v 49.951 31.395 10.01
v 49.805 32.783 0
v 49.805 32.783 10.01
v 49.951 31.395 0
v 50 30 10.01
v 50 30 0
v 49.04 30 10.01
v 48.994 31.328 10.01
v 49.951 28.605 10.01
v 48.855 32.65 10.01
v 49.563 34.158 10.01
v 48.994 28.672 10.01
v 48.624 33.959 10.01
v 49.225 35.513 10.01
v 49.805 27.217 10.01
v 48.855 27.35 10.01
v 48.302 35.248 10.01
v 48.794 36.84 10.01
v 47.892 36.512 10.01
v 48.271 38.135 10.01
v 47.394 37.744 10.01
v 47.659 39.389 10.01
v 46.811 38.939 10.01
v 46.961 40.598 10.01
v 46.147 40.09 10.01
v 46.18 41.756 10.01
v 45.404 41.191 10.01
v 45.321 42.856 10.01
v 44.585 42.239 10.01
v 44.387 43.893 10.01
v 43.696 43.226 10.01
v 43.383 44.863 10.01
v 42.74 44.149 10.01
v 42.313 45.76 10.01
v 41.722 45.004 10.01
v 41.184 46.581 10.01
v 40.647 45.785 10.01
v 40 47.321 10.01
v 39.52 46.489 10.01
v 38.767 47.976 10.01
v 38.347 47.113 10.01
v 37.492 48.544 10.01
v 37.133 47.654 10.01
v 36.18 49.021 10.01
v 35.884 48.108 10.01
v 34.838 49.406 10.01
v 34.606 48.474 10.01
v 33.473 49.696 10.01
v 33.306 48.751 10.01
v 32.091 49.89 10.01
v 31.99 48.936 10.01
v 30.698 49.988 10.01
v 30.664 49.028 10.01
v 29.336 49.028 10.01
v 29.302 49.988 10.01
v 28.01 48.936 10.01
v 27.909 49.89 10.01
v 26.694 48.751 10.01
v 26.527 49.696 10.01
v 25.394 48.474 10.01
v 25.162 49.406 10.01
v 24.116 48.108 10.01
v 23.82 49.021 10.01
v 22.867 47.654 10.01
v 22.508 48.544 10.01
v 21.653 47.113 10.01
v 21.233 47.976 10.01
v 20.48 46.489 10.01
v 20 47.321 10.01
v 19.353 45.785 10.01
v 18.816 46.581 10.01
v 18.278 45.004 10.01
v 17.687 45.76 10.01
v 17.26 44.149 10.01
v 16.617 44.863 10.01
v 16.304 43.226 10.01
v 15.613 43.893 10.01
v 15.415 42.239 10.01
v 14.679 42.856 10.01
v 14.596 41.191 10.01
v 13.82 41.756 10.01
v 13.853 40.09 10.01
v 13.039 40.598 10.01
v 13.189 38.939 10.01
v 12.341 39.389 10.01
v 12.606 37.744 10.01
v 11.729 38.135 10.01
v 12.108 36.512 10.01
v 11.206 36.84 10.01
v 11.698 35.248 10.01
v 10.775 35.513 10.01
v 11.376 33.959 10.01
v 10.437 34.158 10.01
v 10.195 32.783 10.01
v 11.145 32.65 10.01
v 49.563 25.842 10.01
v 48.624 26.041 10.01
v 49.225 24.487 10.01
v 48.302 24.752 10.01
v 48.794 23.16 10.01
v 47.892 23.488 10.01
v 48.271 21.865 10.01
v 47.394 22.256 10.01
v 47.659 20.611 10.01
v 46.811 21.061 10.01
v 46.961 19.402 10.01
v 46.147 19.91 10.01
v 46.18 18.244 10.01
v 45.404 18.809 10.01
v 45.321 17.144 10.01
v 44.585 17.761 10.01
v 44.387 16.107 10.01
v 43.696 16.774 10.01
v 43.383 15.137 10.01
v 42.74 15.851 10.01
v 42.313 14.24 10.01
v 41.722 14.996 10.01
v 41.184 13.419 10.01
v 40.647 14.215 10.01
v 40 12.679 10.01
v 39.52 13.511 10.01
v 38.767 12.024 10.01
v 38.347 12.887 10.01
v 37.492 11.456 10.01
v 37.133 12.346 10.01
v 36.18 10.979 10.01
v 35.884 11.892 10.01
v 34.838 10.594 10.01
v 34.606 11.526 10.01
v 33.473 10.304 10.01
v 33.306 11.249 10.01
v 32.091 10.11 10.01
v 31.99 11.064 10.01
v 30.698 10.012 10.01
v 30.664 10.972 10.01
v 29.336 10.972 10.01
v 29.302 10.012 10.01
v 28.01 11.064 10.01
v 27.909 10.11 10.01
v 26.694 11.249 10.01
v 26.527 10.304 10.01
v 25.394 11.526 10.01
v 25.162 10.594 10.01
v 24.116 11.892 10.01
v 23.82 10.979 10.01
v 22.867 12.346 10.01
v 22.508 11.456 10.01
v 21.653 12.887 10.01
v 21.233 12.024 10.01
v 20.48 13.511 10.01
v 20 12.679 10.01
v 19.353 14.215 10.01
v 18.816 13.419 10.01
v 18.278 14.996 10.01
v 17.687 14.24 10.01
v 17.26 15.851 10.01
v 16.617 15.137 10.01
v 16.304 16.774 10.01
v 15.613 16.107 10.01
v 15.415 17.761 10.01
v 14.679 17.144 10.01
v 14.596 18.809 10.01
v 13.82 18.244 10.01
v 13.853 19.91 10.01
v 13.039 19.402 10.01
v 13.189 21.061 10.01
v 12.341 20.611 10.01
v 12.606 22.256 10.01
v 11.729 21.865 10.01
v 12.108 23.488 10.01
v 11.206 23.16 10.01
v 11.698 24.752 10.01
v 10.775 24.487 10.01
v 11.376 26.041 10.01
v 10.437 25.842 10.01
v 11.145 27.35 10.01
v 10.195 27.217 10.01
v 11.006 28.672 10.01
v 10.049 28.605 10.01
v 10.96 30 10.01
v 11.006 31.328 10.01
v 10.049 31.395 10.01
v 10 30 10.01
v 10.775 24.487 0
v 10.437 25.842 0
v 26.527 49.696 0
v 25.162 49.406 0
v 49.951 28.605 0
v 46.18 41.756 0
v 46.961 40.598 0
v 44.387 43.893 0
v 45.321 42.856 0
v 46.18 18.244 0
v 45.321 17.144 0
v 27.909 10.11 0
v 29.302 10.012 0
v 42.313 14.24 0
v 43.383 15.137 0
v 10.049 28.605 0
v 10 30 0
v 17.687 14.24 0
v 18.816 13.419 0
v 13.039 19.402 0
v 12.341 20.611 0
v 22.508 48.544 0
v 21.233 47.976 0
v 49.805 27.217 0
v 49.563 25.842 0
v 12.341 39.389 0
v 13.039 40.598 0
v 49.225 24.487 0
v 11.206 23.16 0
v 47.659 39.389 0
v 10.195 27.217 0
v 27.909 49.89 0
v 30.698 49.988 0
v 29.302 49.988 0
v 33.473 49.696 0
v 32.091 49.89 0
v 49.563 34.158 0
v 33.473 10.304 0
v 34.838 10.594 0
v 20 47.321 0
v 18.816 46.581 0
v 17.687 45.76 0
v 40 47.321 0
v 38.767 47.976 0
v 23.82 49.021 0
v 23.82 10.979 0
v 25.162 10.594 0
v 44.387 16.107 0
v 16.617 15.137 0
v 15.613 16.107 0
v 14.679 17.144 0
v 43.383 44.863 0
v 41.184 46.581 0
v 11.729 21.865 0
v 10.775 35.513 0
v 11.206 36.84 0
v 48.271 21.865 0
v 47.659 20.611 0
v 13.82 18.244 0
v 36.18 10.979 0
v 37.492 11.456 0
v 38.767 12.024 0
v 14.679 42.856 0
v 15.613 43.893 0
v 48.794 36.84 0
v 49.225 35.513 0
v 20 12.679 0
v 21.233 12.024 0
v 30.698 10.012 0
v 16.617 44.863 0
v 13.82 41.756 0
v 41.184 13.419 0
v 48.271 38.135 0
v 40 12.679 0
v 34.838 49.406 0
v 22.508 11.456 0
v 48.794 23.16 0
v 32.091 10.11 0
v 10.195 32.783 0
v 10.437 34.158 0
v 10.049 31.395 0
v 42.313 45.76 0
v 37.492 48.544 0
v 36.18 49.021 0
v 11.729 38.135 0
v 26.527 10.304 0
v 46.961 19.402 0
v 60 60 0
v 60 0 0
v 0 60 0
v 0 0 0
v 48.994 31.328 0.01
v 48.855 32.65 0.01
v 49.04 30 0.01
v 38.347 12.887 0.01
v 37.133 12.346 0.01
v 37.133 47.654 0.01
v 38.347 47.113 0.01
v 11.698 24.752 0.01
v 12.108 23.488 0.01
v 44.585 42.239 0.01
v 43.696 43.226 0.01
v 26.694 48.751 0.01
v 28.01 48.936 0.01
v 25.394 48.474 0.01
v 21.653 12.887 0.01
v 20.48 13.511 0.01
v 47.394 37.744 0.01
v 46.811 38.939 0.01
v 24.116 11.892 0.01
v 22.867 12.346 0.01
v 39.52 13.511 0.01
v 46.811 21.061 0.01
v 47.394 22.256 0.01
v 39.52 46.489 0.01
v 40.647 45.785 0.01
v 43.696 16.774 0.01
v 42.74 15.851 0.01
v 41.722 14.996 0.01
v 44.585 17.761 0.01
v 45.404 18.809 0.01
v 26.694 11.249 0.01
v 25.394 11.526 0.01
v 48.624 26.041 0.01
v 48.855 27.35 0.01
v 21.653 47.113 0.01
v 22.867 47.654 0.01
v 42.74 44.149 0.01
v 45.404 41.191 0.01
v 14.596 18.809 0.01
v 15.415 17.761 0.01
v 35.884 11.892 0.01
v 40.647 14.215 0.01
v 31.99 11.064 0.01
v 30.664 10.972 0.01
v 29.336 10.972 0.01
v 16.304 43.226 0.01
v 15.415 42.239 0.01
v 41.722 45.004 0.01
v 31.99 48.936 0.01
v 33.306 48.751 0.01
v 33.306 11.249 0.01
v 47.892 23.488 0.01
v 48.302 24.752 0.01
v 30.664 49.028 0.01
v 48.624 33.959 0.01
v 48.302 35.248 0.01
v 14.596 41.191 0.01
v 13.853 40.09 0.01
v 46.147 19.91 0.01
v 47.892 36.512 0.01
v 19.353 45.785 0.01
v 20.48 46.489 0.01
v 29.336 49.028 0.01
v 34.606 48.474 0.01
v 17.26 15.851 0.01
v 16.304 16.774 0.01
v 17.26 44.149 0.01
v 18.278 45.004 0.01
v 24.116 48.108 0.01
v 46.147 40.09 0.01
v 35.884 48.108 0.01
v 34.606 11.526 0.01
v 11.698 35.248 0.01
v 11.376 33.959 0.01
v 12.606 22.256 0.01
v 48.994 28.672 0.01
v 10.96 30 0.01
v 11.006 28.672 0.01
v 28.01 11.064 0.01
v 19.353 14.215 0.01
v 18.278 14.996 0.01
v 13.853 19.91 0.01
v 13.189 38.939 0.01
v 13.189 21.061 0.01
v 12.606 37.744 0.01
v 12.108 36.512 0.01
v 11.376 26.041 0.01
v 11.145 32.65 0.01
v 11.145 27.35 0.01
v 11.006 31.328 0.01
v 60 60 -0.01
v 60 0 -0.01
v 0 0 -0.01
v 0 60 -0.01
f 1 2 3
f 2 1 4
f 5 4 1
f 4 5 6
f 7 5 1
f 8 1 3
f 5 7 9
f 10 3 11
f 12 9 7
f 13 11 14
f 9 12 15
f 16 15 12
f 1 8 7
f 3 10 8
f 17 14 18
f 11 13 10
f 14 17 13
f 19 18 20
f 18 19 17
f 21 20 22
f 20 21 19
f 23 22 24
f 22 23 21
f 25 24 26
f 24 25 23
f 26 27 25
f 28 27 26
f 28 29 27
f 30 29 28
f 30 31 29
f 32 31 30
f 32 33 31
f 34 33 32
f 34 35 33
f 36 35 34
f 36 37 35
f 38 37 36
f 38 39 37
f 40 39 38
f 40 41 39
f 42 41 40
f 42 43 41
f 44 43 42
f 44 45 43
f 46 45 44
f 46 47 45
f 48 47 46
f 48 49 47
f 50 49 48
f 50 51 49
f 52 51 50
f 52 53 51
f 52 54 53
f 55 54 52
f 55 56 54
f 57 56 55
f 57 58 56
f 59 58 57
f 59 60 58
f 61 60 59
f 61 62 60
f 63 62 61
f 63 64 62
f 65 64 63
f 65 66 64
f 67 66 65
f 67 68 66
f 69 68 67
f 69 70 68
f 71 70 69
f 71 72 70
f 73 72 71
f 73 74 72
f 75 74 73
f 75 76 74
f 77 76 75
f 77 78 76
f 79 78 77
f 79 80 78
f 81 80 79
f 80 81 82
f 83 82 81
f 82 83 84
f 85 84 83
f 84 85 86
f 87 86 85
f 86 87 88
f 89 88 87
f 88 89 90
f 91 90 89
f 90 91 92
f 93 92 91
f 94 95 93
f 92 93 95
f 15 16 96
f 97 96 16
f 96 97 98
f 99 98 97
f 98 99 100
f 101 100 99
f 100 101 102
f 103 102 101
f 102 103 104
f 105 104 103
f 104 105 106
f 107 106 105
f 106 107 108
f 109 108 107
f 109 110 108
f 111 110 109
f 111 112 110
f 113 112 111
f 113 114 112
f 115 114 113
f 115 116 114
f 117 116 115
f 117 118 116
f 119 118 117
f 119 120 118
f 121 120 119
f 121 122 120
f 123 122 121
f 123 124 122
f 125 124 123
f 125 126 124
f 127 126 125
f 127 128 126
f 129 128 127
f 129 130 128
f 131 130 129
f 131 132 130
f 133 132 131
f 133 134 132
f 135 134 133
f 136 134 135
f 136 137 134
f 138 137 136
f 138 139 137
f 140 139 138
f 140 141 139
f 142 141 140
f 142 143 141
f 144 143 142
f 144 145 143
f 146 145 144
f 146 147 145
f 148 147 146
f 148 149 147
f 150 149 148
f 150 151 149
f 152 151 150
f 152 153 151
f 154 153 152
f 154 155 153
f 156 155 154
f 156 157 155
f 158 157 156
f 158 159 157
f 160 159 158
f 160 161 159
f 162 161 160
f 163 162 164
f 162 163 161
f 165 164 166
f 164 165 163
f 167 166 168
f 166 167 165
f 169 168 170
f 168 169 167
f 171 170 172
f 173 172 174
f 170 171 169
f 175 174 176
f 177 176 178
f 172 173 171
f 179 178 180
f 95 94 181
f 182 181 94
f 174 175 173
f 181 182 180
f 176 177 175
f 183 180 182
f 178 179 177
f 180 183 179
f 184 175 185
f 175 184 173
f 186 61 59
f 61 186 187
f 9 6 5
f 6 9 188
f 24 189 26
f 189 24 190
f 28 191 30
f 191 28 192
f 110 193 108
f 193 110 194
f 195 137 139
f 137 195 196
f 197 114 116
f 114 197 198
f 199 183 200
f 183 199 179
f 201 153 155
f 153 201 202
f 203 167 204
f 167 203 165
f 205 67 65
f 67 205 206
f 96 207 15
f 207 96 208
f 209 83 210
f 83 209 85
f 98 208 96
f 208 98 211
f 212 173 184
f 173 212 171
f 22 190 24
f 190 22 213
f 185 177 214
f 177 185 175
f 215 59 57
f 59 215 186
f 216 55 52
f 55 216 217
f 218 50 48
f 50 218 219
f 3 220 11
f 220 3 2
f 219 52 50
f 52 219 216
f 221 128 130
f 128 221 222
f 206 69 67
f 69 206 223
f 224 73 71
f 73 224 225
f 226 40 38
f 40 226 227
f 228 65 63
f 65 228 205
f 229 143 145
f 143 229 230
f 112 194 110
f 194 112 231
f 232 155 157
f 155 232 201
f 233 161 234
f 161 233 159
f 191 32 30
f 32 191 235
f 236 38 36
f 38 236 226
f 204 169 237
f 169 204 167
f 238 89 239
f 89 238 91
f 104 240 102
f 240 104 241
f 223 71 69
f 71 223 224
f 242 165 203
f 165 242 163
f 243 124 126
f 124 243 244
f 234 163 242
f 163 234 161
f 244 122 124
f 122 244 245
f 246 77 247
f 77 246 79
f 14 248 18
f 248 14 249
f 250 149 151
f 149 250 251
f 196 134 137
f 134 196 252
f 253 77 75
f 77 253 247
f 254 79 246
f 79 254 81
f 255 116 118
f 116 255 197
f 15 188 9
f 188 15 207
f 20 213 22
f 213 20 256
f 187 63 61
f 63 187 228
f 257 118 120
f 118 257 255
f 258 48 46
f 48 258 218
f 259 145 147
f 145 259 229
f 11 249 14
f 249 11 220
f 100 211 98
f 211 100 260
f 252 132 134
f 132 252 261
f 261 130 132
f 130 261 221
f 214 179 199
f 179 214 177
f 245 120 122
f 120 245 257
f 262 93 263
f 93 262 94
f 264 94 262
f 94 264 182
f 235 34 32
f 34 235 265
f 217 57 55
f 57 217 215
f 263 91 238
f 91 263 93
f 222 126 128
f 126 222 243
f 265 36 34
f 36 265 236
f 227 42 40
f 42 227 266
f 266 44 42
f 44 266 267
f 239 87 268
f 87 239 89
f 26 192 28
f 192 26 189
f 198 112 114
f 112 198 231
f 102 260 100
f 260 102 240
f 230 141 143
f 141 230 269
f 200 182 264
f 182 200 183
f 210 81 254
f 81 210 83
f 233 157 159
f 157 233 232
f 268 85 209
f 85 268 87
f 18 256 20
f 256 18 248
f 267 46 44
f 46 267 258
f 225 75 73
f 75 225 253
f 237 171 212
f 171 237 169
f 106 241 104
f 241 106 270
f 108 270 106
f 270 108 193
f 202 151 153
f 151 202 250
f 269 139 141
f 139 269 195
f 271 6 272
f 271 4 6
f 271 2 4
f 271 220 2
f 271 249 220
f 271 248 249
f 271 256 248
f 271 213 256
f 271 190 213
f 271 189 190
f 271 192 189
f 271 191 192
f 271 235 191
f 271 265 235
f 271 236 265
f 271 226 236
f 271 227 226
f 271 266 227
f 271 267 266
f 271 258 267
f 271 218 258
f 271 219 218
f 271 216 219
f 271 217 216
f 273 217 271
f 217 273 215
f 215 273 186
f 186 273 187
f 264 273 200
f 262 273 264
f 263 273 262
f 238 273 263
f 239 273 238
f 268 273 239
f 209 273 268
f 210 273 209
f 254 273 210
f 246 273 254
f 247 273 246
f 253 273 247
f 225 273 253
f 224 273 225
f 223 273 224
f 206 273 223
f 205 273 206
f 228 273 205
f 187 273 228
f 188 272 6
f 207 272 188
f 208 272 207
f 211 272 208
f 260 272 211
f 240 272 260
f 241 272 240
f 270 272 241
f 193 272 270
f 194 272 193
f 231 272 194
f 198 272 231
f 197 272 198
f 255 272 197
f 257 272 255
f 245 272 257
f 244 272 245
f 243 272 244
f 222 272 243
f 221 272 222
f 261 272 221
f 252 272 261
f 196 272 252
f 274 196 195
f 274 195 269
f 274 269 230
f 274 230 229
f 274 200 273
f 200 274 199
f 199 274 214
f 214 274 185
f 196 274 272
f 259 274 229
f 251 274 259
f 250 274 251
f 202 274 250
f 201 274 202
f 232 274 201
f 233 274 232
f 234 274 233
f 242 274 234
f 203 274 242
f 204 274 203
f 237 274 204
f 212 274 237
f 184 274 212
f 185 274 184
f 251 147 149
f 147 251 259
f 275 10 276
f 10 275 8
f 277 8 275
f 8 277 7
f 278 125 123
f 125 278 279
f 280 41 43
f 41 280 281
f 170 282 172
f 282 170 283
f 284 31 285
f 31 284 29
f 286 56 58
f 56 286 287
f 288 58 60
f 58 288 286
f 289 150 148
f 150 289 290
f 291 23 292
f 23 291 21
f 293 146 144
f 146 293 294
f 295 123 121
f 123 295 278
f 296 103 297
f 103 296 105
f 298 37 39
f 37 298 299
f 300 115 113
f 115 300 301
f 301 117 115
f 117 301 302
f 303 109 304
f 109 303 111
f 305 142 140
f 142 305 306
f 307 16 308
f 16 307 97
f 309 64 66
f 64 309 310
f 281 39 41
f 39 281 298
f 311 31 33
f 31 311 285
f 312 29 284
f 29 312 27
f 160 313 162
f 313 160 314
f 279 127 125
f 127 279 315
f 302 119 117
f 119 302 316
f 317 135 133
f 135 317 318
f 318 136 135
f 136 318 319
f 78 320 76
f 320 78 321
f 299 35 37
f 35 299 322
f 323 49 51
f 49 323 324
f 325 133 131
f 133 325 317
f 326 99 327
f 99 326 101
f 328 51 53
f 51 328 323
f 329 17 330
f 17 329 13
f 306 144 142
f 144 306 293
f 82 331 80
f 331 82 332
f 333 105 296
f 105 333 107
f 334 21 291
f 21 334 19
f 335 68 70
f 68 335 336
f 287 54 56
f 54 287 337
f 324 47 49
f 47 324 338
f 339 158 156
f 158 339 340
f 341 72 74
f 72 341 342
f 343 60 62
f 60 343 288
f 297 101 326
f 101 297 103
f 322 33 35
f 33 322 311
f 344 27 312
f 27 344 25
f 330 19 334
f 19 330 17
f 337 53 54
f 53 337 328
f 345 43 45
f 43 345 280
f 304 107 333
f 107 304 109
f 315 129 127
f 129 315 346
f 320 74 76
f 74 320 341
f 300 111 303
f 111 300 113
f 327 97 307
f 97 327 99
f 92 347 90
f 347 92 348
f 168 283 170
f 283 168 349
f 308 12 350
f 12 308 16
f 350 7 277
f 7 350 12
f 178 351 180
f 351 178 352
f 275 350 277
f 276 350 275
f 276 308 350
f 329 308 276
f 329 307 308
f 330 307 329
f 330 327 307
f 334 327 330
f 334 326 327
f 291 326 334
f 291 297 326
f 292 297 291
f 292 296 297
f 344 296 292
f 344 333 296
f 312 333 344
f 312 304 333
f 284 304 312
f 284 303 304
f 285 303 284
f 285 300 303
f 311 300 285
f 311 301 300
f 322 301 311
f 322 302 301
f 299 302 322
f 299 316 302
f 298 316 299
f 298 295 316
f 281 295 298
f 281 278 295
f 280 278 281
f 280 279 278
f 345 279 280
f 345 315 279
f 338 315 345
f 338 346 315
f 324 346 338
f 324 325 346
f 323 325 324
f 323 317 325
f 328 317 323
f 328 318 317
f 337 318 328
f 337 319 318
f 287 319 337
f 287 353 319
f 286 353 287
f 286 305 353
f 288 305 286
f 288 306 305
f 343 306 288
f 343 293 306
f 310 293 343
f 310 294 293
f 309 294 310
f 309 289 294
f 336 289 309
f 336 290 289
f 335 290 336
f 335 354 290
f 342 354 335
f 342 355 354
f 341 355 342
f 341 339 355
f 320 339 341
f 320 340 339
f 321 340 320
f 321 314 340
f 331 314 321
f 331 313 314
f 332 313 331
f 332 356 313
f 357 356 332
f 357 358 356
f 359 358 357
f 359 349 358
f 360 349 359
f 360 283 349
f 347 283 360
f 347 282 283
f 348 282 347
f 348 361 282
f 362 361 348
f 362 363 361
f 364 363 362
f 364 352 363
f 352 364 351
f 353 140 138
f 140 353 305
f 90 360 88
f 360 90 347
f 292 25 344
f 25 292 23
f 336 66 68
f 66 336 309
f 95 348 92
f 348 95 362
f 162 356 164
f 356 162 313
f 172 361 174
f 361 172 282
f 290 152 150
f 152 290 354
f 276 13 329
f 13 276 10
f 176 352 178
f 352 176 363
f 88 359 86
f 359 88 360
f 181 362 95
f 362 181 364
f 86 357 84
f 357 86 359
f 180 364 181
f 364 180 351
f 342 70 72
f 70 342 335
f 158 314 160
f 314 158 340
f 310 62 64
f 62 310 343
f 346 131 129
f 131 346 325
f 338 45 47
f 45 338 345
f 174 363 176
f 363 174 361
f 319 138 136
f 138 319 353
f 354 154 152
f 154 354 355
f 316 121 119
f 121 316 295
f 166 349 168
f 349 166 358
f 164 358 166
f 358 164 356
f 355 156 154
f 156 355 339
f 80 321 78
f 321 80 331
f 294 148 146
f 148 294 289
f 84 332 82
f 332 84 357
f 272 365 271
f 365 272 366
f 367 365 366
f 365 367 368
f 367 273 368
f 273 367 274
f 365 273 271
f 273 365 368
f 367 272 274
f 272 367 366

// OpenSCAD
// file: ../Base/PlacementOptions.scad
// Fischertechnik Box Foundation
// Placement Options

// Alignment
NoAlign = 0;
AlignLeft = 1;
AlignBottom = 2;
AlignCenter = 3;
AlignRight = 4;
AlignTop = 5;

// Element rotation degree steps
rotations = [0, -90, -180, -270];

// Rotation
NoRotation = 0;
Rotate0 = 0;
Rotate90 = 1;
Rotate180 = 2;
Rotate270 = 3;

// Docking (seen from above)
NoDock = -1;
DockLeft = 0;
DockTop = 1;
DockRight = 2;
DockCorner = 2;
DockBottom = 3;

// Web corners
LowerLeft = 0;
UpperLeft = 1;
UpperRight = 2;
LowerRight = 3;

// Web position relative to corner
LeftOfCorner = 0;
RightOfCorner = 1;
// file: ../Base/Boxes.scad
// Fischertechnik Box Foundation
// Pre-designed Boxes

use <Constants.scad>

include <PlacementOptions.scad>

box190Width = 190;
box190Depth = 130;
box130Width = 130;
box130Depth = 95;
boxUsageHeight = 33.9;
boxWallThickness = 2.4;
boxBaseThickness = 1.0;
boxWebWidth = 3.0;

// getBoxWallThickness()
// Gets the wall thickness of a Fischertechnik Box

function getBoxWallThickness() = boxWallThickness;

// Gets the usable height of a fischertechnik box
function getBoxUsageHeight() = boxUsageHeight;

// Gets the thickness of the Fischertechnik box base.
function getBoxBaseThickness() = boxBaseThickness;

// Gets the width of a box web
function getBoxWebWidth() = boxWebWidth;

// Gets the usable inner space of a Box 190 as an x/y-list
function getBox190Space() = [
    box190Width - 2*getBoxWallThickness(), 
    box190Depth - 2*getBoxWallThickness() ];

// Imports the Fischertechnik empty box 130x190 mm and places it at position 0,0
// 190x130 are the outer sizes, the inner space is slightly smaller. Use getBox190Space() to get the inner sizes.
// This module needs the STL file "Fischertechnik Box 130x190.stl" in the library path.
// The box is positioned that the usable inner space is at the 0,0,0 position. The

module Box190() {
    translate([-getBoxWallThickness(),-getBoxWallThickness(),-getBoxBaseThickness()])
        import("Fischertechnik Box 130x190.stl", convexity=3);
}

// Gets the usable inner space of a Box 130 as an x/y-list
function getBox130Space() = [
    box130Width - 2*getBoxWallThickness(), 
    box130Depth - 2*getBoxWallThickness() ];

// Imports the Fischertechnik empty box 95x130 mm and places it at position 0,0
// 190x130 are the outer sizes, the inner space is slightly smaller. Use getBox190Space() to get the inner sizes.
// This module needs the STL file "Fischertechnik Box 95x130.stl" in the library path.
// The box is positioned that the usable inner space is at the 0,0,0 position. The

module Box130() {
    translate([-getBoxWallThickness(),-getBoxWallThickness(),-getBoxBaseThickness()])
        import("Fischertechnik Box 95x130.stl", convexity=3);
}

// Creates a web at the specified box walls
// corner 0 = LowerLeft, 1 = UpperLeft, 2 = UpperRight, 3 = LowerRight
// side 0 = LeftOfCorner, 1 = RightOfCorner
// distance = Distance in mm from the corner
// box = inner width and depth of the box (default: Box 190)
// webWidth = length of the web (default is 3 mms)
// webThickness = thickness of the web (default is 1 mm)

module BoxWeb(corner, side, distance, box=getBox190Space(), webWidth=getBoxWebWidth(), webThickness=1.0) {
    sink = getBoxWallThickness()/2;

    width = (corner % 2 == 0) ? 
            (side == LeftOfCorner ? webWidth : webThickness) :
            (side == LeftOfCorner ? webThickness : webWidth);

    depth = (corner % 2 == 0) ? 
            (side == RightOfCorner ? webWidth : webThickness) :
            (side == RightOfCorner ? webThickness : webWidth);
    
    xDiff = corner == LowerLeft ? 
                (side == LeftOfCorner ? -sink : distance) :
            (corner == UpperLeft ?                
                (side == LeftOfCorner ? distance : -sink) :
            (corner == UpperRight ?
                (side == LeftOfCorner ? box.x-webWidth+sink : box.x-distance-webThickness) :
                (side == LeftOfCorner ? box.x-distance-webThickness: box.x-webWidth+sink)));

    yDiff = corner == LowerLeft ? 
                (side == RightOfCorner ? -sink : distance) :
            (corner == UpperLeft ?
                (side == RightOfCorner ? box.y-distance : box.y-webWidth+sink) :
            (corner == UpperRight ?
                (side == RightOfCorner ? box.y-webWidth+sink : box.y-distance) :
                (side == RightOfCorner ? distance : -sink)));
    
    translate([xDiff, yDiff, -getExcess()])
        cube([width, depth, boxUsageHeight + 2*getExcess()]);
}
// file: ../Base/Rotation.scad
// Fischertechnik Box Foundation
// Geometry Helpers Rotation

include <PlacementOptions.scad>

// getRotatedSpace(space, rotation=NoRotation)
// Rotates the space dependent on the specified rotation

function getRotatedSpace(space, rotation=NoRotation) = [
    (rotation == Rotate90 || rotation == Rotate270) ? space.y : space.x,
    (rotation == Rotate90 || rotation == Rotate270) ? space.x : space.y
];

// Rotates the given space around the fixed left lower corner
// space = the space the children needs as width/depth list [width,depth]
// rotation = 0 Rotate0 degrees, 1 Rotate90 degrees, 2 Rotate180 degrees, 3 Rotate270 degrees (equivalent to -90)

module RotateFix(space, rotation=NoRotation) {
    dy = (rotation == Rotate0 || rotation == Rotate270) ? 0 :
        (rotation == Rotate90) ? space.x :
        space.y;
    dx = (rotation < Rotate180) ? 0 :
        (rotation == Rotate180) ? space.x :
        space.y;
    
    translate([dx, dy, 0])
        rotate([0, 0, rotations[rotation]])
            children();
}
// file: ../Base/Alignment.scad
// Fischertechnik Box Foundation
// Geometry Helpers Alignment

include <PlacementOptions.scad>

// getAlignedX(elementWidth, spaceWidth, align=AlignRight, offset=0)
// Gets the aligned X offset of an element with the given
// width in the given space.
// elementWidth = The width of the element to positon
// spaceWidth = The space where the element should be aligned
// align = 0 AlignLeft, 1 AlignCenter, 2 AlignRight
// offset = an optional offset from the aligned position. When
// aligned left or centered, then positive values are in X direction.
// When aligned right then positive values are in negative X direction.

function getAlignedX(elementWidth, spaceWidth, align=AlignRight, offset=0) =
    (align == AlignLeft) ?
        offset :
        ((align == AlignCenter) ?
        (spaceWidth - elementWidth)/2 + offset :
        spaceWidth - offset - elementWidth);

// getAlignedY(elementDepth, spaceDepth, align=AlignTop, offset=0)
// Gets the aligned Y offset of an element with the given
// depth in the given space.
// elementDepth = The depth of the element to positon
// spaceDepth = The space where the element should be aligned
// align = 0 AlignBottom, 1 AlignCenter, 2 AlignTop
// offset = an optional offset from the aligned position. When
// aligned bottom or centered, then positive values are in Y direction.
// When aligned top then positive values are in negative Y direction.

function getAlignedY(elementDepth, spaceDepth, align=AlignTop, offset=0) =
    (align == AlignBottom) ?
        offset :
        ((align == AlignCenter) ?
        (spaceDepth - elementDepth)/2 + offset :
        spaceDepth - offset - elementDepth);
// file: ../Base/Placement.scad
// Fischertechnik Box Foundation
// Geometry Helpers Placement

use <Constants.scad>
use <Alignment.scad>
use <Rotation.scad>
use <Boxes.scad>

include <PlacementOptions.scad>

// Place(x=0, y=0, elementSpace=[0,0], alignX=AlignLeft, alignY=AlignBottom, rotation=Rotate0, boxSpace=getBox190Space())
// Places the child at the specified position
// y = Y-Position. This is a relative position when an X aligment is specified.
// x = X-Position. This is a relative position when an Y aligment is specified.
// elementSpace = space of the element to be placed [x,y]
// alignX = -1=NoAlign, 0 AlignLeft, 1 AlignCenter, 3 AlignRight (elementSpace and boxSpace required!)
// alignY = -1=NoAlign, 2 AlignBottom, 1 AlignCenter, 4 AlignTop (elementSpace and boxSpace required!)
// rotation = 0 Rotate0 0 degrees, 1 Rotate90 90 degrees, 
// 2 Rotate180 180 degrees, 3 Rotate270 270 degrees (equivalent to -90)
// boxSpace = Inner space of the box where the placement occurs [x,y] - default is Box 190x130 inner space

module Place(x=0, y=0, elementSpace=[0,0], 
  alignX=AlignLeft, alignY=AlignBottom, 
  rotation=NoRotation, boxSpace=getBox190Space()) {

    module Position(x, y, space, rotation=Rotate0) {
        translate([x, y, 0])
            RotateFix(space, rotation)
                children();
    }

    space = getRotatedSpace(elementSpace, rotation);
    alignedX = getAlignedX(space.x, boxSpace.x, alignX, x);
    alignedY = getAlignedY(space.y, boxSpace.y, alignY, y);
    Position(alignedX, alignedY, elementSpace, rotation)
        children();
}

// Center(space=getBox130Space(), elementSpace=[0,0])
// space = Space where the children is centered. For cylinder use centered=true and no elementSpace.
// elementSpace = space of the element to be centered [x,y]

module Center(space=getBox190Space(), elementSpace=[0,0]) {
    translate([(space.x - elementSpace.x) / 2, (space.y - elementSpace.y) / 2])
        children(0);
}

// CenterHorizontal(width=0, y=0, offset=0, space=getBox130Space())
// space = Space where the children is centered. For cylinder use centered=true and no elementSpace.
// elementSpace = space of the element to be centered [x,y]

module CenterHorizontal(width=0, y=0, offset=0, space=getBox190Space()) {
    translate([(space.x - width) / 2 + offset, y])
        children(0);
}

// CenterVertical(depth=0, x=0, offset=0, space=getBox130Space())
// space = Space where the children is centered. For cylinder use centered=true and no elementSpace.
// elementSpace = space of the element to be centered [x,y]

module CenterVertical(depth=0, x=0, offset=0, space=getBox190Space()) {
    translate([x, (space.y - depth) / 2 + offset])
        children(0);
}
// file: ../Base/Constants.scad
// Fischertechnik Box Foundation
// Constants

// Constant values necessary for multiple elements

// Base constants
dividerThickness = 1.2;
excess = 0.01;
fragments = 90;
tolerance = 0.8;

// Gets the thickness of a divider 
function getDividerThickness() = dividerThickness;

// Gets the excess that is used to merge walls into each other
function getExcess() = excess;

// Gets amount of fragments of a cylinder
function getFragments() = fragments;

// Gets the inner tolerance of a frame to each side
function getTolerance() = tolerance;


// Fischertechnik specific constants
axisDiameter = 4;
axisBottomDiameter = axisDiameter + 1;
axisTolerance = 0.2;

// Gets axis diameter of Fischertechnik axis
function getAxisDiameter() = axisDiameter;

// Gets axis diameter tolerance (subtracted for element axis)
function getAxisTolerance() = axisTolerance;

// Gets the axis diameter for standing axis
function getStandAxisDiameter() = getAxisDiameter() - getAxisTolerance();

// Gets axis bottom diameter for thicker part at the bottom
function getAxisBottomDiameter() = axisBottomDiameter;

standardEdgeDistance = 2.5;
standardWebDistance = 11.5;
standardCornerLength = 15;

// gets the standard distance to the wall of the box for dockable frames with webs
function getStandardEdgeDistance() = standardEdgeDistance;

// gets the standard distance of each web to the corner of the dockable frame
function getStandardWebDistance() = standardWebDistance;

// gets the standard length of the corner walls of a dockable frame
function getStandardCornerLength() = standardCornerLength;

tubeWallFactor = 0.8;

// gets the wall thickness of a tube.
function getTubeWallThickness() = tubeWallFactor * getDividerThickness();

smallPartsFrameHeight = 20;

// gets the frame height for docked small parts boxes.
function getSmallPartsFrameHeight() = smallPartsFrameHeight;

hubRingDiameter = 19.5;
hubRingLevelDiameter = 21;

// gets the diameter of a tube matching the inner ring of a wheel
function getHubRingDiameter() = hubRingDiameter;

// gets the diameter of a hub tube with a thicker diameter
function getHubRingLevelDiameter() = hubRingLevelDiameter;
// main file
// Fischertechnik Box Library
// Cylinders for large pulley wheel
// 31019

use <../Base/Constants.scad>
use <../Base/Placement.scad>
use <../ModelBase/Simple.scad>

/* [Element Parameters] */
count = 1;  // [1, 2]

/* [Hidden] */
width = 60;
depth = 60;
height = 15;
wheelThickness = 5;

// getCylinderLargePulleyWheelSpace
// Gets the space the cylinder for the large pulley wheel needs.

function getCylinderLargePulleyWheelSpace() = [width, depth, height];

// CylinderLargePulleyWheel
// Two cylinders for the large pulley wheel

module CylinderLargePulleyWheel(count=count) {
    Space(getCylinderLargePulleyWheelSpace());

    ringDiameter = 40;
    diameter = getHubRingDiameter();
    levelDiameter = getHubRingLevelDiameter();
    levelHeight = height - count * wheelThickness;

    Center(getCylinderLargePulleyWheelSpace()) {
        Tube(levelHeight, outerDiameter=ringDiameter);
        LeveledTube(height, diameter, levelHeight, levelDiameter);
    }
}

// Test
color("lightgray")
CylinderLargePulleyWheel(count);
